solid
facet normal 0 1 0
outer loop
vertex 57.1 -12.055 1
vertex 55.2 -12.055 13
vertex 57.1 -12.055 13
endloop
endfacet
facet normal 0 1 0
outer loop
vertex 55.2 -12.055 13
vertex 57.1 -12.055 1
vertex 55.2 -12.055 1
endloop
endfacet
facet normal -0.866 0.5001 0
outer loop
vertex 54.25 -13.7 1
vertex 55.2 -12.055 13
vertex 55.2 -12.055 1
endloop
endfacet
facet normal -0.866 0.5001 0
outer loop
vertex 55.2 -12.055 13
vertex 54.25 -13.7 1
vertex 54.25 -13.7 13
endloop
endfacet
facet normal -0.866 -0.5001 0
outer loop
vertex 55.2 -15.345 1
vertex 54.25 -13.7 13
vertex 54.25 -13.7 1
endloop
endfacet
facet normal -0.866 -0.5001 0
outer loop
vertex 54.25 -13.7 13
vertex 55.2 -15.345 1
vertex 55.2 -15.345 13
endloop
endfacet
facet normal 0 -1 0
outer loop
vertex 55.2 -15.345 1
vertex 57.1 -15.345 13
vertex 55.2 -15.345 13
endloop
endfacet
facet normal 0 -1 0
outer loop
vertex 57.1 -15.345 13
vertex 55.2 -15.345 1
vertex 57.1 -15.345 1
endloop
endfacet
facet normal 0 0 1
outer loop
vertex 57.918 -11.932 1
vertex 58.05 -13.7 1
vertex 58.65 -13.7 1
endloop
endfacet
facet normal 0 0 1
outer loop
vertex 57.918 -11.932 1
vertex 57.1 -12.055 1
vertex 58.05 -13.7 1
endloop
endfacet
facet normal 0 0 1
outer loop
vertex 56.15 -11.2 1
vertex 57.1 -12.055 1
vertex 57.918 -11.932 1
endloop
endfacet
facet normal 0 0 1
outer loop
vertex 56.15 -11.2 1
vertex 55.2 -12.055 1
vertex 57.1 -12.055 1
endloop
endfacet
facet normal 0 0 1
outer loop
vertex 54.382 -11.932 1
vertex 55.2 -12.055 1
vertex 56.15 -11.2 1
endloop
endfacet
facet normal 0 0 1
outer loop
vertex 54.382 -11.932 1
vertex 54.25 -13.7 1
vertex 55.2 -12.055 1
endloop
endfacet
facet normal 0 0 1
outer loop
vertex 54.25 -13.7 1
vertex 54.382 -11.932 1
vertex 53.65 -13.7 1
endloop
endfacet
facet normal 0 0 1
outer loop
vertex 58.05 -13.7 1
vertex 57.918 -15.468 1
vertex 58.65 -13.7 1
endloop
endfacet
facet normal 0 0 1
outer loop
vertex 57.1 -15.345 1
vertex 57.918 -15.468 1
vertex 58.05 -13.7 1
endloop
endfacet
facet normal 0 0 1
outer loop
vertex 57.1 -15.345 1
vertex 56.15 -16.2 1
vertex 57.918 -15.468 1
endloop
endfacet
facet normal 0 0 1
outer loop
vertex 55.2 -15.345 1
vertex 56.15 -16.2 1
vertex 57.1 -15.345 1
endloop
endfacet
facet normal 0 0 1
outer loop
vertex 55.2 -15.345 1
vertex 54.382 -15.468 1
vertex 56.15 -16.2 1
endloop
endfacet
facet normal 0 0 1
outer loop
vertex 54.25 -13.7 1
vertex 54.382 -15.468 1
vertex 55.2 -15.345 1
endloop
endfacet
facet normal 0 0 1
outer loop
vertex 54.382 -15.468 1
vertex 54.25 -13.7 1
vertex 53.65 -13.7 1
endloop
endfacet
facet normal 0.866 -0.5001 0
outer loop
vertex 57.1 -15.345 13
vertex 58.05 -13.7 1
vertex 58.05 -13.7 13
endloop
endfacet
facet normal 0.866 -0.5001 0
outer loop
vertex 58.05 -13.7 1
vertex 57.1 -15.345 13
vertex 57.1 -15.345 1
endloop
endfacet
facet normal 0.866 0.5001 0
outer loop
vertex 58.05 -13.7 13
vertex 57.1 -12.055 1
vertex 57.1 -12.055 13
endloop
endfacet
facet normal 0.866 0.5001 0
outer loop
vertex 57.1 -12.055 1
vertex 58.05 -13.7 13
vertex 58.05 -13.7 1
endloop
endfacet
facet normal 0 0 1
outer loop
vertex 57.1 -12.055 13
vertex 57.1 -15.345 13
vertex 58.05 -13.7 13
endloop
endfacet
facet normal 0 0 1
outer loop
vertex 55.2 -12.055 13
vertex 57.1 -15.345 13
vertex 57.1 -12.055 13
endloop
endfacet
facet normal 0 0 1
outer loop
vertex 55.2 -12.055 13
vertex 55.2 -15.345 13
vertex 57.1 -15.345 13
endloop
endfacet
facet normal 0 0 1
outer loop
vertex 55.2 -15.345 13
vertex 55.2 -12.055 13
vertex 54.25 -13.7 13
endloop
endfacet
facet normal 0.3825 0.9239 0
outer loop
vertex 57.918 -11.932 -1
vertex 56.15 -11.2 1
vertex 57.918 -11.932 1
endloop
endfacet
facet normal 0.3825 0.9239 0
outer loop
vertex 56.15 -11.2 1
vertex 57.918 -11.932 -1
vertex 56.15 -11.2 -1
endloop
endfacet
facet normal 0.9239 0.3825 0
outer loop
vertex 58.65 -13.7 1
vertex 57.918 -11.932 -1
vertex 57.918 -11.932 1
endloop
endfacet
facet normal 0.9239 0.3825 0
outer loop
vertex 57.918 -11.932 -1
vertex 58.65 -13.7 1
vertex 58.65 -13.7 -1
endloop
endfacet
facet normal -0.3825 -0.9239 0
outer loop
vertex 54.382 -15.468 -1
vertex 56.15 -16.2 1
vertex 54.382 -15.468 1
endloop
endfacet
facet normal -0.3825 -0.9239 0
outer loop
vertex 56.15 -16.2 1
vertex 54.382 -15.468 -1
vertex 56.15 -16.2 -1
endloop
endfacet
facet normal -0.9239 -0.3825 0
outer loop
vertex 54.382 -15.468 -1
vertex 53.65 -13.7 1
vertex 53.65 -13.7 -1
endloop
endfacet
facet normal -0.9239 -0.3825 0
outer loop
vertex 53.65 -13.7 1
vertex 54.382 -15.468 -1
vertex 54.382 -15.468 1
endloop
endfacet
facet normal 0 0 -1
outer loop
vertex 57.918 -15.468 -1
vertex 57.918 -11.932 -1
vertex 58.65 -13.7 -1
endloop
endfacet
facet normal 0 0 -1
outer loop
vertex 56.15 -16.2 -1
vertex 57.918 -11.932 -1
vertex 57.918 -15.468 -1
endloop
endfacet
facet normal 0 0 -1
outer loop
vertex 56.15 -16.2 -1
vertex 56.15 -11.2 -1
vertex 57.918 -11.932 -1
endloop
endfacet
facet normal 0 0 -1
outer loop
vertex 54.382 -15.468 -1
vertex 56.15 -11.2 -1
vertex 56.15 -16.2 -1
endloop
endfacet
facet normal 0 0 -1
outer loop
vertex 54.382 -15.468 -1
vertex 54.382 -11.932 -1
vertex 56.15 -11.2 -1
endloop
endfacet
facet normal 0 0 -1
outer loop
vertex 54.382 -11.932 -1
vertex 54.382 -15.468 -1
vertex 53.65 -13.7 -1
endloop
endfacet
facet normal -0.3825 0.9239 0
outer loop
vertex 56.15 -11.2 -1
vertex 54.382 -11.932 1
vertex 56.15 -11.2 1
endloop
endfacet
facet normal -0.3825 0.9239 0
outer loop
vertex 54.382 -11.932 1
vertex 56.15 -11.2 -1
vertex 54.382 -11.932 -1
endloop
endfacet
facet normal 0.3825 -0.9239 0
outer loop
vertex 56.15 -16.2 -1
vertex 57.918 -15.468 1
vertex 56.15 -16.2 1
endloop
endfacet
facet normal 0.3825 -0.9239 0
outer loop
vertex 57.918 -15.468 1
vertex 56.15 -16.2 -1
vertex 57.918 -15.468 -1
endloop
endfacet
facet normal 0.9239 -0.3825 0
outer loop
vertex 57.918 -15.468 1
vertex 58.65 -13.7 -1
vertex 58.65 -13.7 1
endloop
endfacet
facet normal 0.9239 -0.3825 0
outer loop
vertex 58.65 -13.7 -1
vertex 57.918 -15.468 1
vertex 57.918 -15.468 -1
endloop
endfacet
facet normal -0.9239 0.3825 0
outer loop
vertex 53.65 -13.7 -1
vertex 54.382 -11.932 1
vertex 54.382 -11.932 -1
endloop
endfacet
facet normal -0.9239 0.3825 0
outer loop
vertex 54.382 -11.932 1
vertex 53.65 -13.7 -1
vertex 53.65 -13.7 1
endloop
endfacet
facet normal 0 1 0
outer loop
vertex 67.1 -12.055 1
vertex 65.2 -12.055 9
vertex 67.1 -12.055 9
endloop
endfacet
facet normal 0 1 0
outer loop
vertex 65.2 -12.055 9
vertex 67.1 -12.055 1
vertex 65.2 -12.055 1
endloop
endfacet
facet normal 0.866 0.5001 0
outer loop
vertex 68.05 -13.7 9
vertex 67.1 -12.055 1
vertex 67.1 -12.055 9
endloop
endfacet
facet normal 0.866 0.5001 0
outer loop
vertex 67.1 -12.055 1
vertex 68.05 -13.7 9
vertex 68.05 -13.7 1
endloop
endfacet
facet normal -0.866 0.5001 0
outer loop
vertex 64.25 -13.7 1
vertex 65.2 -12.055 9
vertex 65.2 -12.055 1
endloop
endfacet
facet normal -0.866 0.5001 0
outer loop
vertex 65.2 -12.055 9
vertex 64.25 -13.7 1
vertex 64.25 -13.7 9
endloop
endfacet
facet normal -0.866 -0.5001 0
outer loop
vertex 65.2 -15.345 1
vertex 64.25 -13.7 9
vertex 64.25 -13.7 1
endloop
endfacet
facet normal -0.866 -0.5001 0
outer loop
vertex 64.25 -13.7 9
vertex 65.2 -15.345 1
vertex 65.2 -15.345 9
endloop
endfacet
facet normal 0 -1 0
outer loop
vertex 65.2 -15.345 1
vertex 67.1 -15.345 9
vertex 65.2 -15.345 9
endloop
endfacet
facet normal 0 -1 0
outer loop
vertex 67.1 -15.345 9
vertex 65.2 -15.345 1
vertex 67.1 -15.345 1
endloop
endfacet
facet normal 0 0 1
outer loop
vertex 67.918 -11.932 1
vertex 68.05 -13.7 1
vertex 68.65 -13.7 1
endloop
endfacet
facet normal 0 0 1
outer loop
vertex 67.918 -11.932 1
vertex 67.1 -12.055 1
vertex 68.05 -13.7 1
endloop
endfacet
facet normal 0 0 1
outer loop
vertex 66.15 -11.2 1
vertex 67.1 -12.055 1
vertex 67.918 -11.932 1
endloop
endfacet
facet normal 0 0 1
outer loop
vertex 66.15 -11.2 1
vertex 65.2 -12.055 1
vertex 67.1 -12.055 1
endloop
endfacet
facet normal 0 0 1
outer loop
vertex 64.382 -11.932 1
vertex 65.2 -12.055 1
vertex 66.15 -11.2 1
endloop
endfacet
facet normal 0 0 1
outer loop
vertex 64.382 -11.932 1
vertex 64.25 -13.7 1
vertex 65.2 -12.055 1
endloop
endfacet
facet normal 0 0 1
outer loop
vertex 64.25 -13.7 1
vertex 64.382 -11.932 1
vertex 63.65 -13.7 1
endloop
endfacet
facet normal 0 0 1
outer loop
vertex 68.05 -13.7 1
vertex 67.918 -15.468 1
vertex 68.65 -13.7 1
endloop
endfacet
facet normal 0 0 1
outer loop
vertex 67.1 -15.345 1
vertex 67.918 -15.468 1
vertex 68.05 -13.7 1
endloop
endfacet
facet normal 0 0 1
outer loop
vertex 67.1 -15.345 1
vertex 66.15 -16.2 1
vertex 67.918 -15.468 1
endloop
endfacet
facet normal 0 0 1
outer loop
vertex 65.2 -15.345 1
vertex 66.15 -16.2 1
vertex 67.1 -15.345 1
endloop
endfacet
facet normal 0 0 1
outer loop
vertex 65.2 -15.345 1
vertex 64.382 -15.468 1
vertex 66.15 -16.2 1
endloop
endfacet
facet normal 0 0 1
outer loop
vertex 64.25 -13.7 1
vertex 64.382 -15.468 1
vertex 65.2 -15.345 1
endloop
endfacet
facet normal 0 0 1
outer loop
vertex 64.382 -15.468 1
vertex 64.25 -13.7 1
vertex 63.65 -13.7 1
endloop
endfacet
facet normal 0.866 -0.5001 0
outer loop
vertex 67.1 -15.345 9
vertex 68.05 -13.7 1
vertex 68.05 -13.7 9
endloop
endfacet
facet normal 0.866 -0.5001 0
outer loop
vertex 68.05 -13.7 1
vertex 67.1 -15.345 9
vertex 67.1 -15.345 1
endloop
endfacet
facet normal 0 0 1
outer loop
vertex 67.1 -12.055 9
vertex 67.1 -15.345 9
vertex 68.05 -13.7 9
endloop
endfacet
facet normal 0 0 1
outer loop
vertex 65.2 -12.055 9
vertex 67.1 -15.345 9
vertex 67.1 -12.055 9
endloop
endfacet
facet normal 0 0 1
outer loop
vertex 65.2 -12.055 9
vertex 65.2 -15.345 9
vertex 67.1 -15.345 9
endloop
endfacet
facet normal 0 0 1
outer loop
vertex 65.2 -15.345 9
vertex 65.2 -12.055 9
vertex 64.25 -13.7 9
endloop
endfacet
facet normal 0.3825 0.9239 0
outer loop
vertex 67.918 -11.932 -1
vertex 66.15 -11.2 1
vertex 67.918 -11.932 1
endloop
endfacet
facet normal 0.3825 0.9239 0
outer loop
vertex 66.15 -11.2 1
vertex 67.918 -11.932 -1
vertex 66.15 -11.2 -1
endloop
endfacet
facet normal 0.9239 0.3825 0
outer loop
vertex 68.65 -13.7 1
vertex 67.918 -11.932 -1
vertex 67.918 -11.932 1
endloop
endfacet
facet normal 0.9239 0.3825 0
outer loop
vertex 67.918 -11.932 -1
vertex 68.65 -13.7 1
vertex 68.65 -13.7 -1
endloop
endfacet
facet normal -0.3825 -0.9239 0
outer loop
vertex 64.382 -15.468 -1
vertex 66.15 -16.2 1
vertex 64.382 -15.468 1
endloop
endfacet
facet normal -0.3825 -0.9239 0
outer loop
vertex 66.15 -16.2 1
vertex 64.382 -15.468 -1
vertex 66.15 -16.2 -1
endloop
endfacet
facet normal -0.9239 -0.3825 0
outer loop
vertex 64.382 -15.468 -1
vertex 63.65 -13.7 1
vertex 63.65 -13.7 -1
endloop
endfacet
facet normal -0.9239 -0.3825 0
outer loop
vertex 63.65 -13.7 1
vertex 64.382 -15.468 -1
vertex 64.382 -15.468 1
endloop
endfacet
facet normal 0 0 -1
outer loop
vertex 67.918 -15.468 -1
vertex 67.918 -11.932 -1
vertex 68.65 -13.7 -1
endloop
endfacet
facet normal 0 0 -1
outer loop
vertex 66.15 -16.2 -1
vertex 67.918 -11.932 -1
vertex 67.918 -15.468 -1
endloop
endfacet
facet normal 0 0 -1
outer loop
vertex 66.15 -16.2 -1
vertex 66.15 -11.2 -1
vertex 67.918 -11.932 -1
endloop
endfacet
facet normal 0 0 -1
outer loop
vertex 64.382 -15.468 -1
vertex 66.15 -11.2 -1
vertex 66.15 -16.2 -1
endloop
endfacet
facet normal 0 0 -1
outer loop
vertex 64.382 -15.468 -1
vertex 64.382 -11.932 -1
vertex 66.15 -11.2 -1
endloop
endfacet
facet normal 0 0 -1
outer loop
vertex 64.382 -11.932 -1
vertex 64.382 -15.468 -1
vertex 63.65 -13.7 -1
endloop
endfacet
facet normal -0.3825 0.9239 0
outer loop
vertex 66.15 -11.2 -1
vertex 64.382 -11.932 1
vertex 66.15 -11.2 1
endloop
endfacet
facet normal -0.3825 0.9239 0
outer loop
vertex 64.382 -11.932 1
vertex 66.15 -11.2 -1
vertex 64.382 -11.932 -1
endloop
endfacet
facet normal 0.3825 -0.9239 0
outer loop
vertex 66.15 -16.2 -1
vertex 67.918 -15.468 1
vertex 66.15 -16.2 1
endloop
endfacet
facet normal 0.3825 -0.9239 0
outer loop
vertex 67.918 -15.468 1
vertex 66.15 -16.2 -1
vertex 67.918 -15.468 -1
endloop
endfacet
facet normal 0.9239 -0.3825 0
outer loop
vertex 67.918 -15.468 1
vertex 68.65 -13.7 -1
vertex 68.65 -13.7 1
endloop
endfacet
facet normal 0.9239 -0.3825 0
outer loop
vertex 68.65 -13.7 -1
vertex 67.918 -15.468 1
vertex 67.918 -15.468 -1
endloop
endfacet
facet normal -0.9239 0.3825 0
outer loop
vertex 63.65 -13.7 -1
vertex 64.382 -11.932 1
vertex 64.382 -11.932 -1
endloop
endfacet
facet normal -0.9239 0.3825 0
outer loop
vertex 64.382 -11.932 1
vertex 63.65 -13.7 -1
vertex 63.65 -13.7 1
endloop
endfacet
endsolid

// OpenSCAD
// file: board_cover.scad
use <body_thin.scad>

/**
* [x] screw plates
* [x] side hooks
*
*
*
*
*
*/

/**
 * TODO
 * - [x] sensor plate
 *.- reset button
 *.- [x] complete the perimeter
 * - figure out how to fix cover to the body 
 *
 */
$fn = 50;
cube1Rotation = [-15, 0, -30];
cube1Offset = [32, -127.5, 0];

cube2Rotation = [0, 0, 0];
cube2Offset = [-56.6, 0, 0];

resetButtonPosition = [56.15, -13.7, 0];
resetButtonRadius = 2;

hoverHeight = 13;
coverHeight = 9;

function getResetButtonPosition() = resetButtonPosition;
function getResetButtonRadius() = resetButtonRadius;
function getCoverHeight() = hoverHeight;

module cuttingcubes() {
  // cutting cube near main cluster
  translate(cube2Offset) {
    rotate([0, 0, 0]) {
      cube([206, 200, 200], center=true);
    }
  }

  // cutting cubes near the thumb cluster
  translate(cube1Offset) {
    rotate(cube1Rotation) {
      cube([200, 200, 200], center=true);
    }
  }
}

module verticalWall() {
  difference() {
    // cutting cube near main cluster
    translate([1, 0, 0]) {
      translate(cube2Offset) {
        rotate([0, 0, 0]) {
          cube([206, 200, 200], center=true);
        }
      }
    }

    // cutting cube near main cluster
    translate(cube2Offset) {
      rotate([0, 0, 0]) {
        cube([206, 210, 210], center=true);
      }
    }
  }
}

module usbPort() {
  // USB-C cut
  translate([60, 28, 3.5]) {
    rotate([0, 90, 90]) {
      hull() {
        cylinder(h=10, r=2.5, center=false);
        translate([0, 7, 0])
          cylinder(h=10, r=2.5, center=false);
      }
    }
  }
}

module innerWalls(coverHeight) {
  intersection() {
    difference() {
      translate([0, 0, -1]) {
        translate(getGlobalMove()) {
          linear_extrude(coverHeight) {
            minkowski() {
              import("outline.svg");
              circle(getWallThickness());
            }
          }
        }
      }
      cuttingcubes();
    }
    union() {
      translate([0, 1, 0]) {
        translate(cube1Offset) {
          rotate(cube1Rotation) {
            cube([200, 200, 200], center=true);
          }
        }
      }

      verticalWall();
    }
  }
}

module resetButtonWalls(coverHeight) {

  // reset button walls
  translate([0, 0, 3]) {
    translate(resetButtonPosition) {
      linear_extrude(coverHeight-3) {

        difference() {
          circle(r=resetButtonRadius + getWallThickness());
          circle(r=resetButtonRadius);
        }
      }
    }
  }
}

module cover() {

  difference() {
    translate(getGlobalMove()) {
      difference() {

        linear_extrude(coverHeight) {
          minkowski() {
            bodyProjection();
            circle(getWallThickness());
          }
        }

        union() {
          translate([0, 0, -1.5]) {
            linear_extrude(coverHeight) {
              minkowski() {
                bodyProjection();
                circle(0.3);
              }
            }
          }
        }
      }
    }
    cuttingcubes();

    // reset button cutout
    translate([0, 0, 6]) {
      translate(resetButtonPosition) {
        linear_extrude(10) {
          circle(r=resetButtonRadius);
        }
      }
    }

    //translate([-58, 20, 5]) {
    //  cube([12, 40, 11], center=true);
    //}

    usbPort();
  }

  resetButtonWalls(coverHeight);

  //cuttingcubes();

  //translate([-68, -5, -1]) {
  //cube([12, 5, 11], center=true);
  //}

  innerWalls(coverHeight);

  // hooks
  intersection() {
    hooksBlock();
    cuttingcubes();
  }
}

if (true) {
  cover();
}
// file: body_thin.scad
/**
 * [x] add screws islands
 * [x] add cover panel
 * [x] design cover for shield
 * [x] mark buttons positions
 * create a travel case
 * move battery location to the side
 * move sheld to the bottom
 * optimize the globalMove usage
 */

//hull() {
$fn = 40;
magnet_radius = 4 / 2 + 0.1;
globalMove = [-209.55, -99.5, 0];

holePosition1 = [161.15, 94.95, 0];
holePosition2 = [161.1, 113.9, 0];
holePosition3 = [237.1, 117.4, 0];
holePosition4 = [250.87, 70.05, 0];
wallThickness = 1.2;

sensorRadius = 20;
sensorPosition = [67, 13];

function getWallThickness() = wallThickness;
function getGlobalMove() = globalMove;
function getSensorPosition() = sensorPosition;
function getSensorRadius() = sensorRadius;

module bottom_panel(hide_side_magnets = false) {
  translate([-0, -0, 10.5]) {
    //translate([0, 0, 13]) {
    rotate([-3, 1, 0]) {
      translate([-20, 0, -12.8]) {
        cube([300, 200, 15], center=true);
      }

      translate([0, 0, 0]) {
        legs();
      }

      magnets2(hide_side_magnets1=hide_side_magnets);

      scale([1, -1, 1]) {
        magnets2(hide_side_magnets1=hide_side_magnets);
      }
    }
    //}
  }
}

module magnets2(hide_side_magnets1 = false) {
  leg1 = [64.4, -21.0, 15];
  translate(leg1) {
    cylinder(h=40, r=magnet_radius, center=true);
  }

  if (!hide_side_magnets1) {
    rotate([0, 0, 180]) {
      translate(leg1) {
        cylinder(h=40, r=magnet_radius, center=true);
      }
    }
  }
  translate([0, -22, 15]) {
    cylinder(h=40, r=magnet_radius, center=true);
  }
}

module battery() {
  cube([25, 43, 5]);
}

module legs() {
  legmove1 = [43, 21.0, 0];
  //legmove2 = [43, 11.0, 0];
  translate([0, 0, -5.0]) {

    translate([75, 15, 0]) {
      cube([12, 3.5, 1], center=true);
    }

    translate(legmove1) {
      leg3();
    }

    scale([-1, 1, 1]) {
      translate(legmove1) {
        leg3();
      }
    }

    scale([-1, -1, 1]) {
      translate(legmove1) {
        leg3();
      }
    }

    scale([1, -1, 1]) {
      translate(legmove1) {
        leg3();
      }
    }

    //    scale([1, -1, 1]) {
    //  translate(legmove2) {
    //    leg();
    //  }
    //}
    //translate([102, 14.5, 0]) {
    //  leg();
    //}
  }

  module leg3() {
    leg();

    translate([0, 10, 0]) {
      leg();
    }

    translate([0, -10, 0]) {
      leg();
    }

    translate([0, 20, 0]) {
      leg();
    }
  }

  /*
  translate([-64, -25, -7.5]) {

    rotate([0, 0, -40]) {
      translate([2, -7, 0]) {
        leg();
      }
      translate([2, 2, 0]) {
        leg();
      }
    }

    translate([102, 5.5, 0]) {
      leg();
    }
    translate([102, 14.5, 0]) {
      leg();
    }

    translate([-5, 56, 0]) {
      leg();
    }
    translate([-5, 46, 0]) {
      leg();
    }

    translate([102, 46, 0]) {
      leg();
    }
    translate([102, 55, 0]) {
      leg();
    }
  } */
}

module leg() {
  cube([20, 3.5, 1], center=true);
  /*
  linear_extrude(2, center=true) {
    hull() {
      circle(4);

      translate([14, 0, 0]) {
        circle(4);
      }
    }
  }
  */
}

module stand() {
  difference() {
    union() {
      cylinder(h=4, r=1.8);
      cylinder(h=3, r1=4.5, r2=4);
    }
    cylinder(h=5, r=1);
  }
}

module pcb() {
  translate([0, 0, 12.5]) {
    linear_extrude(1.5) {
      psbProjectionNormalized();
    }
  }
}

module bodyProjectionNormalized() {
  union() {
    psbProjectionNormalized();

    translate(sensorPosition) {
      circle(r=sensorRadius - wallThickness / 2);
    }
  }
}

module psbProjectionNormalized() {
  translate(globalMove) {
    import("outline.svg");
  }
}

module bodyProjection(showTouchpad = false) {
  import("outline.svg");

  if (showTouchpad) {
    translate(-globalMove) {
      translate(sensorPosition) {
        circle(r=sensorRadius - wallThickness / 2);
      }
    }
  }
}

module bodyProjectionTouchpad() {
  import("outline.svg");

  translate(-globalMove) {
    translate(sensorPosition) {
      circle(r=sensorRadius - wallThickness / 2);
    }
  }
}

module body() {

  difference() {
    translate(globalMove) {
      union() {

        difference() {
          linear_extrude(15.5) {
            minkowski() {
              bodyProjection();
              circle(wallThickness);
            }
          }

          translate([0, 0, 9]) {
            linear_extrude(10) {
              minkowski() {
                bodyProjection();
                circle(0.3);
              }
            }
          }

          //translate([3, 0, 6]) {
          //  battery();
          //}

          translate([6, 270, 13])
            cube([8, 30, 10]);
        }

        linear_extrude(11.5) {
          minkowski() {
            import("outline_empty.svg");
            circle(0.3);
          }
        }
      }
    }

    bottom_panel();

    // power slider cutout
    translate([77.2, -15, 17]) {
      cube([30, 8, 8], center=true);
      translate([-10, 0, 0]) {
        rotate([0, -90, 0]) {
          rotate([0, 0, 45]) {
            cylinder(h=3, r1=9, r2=1, center=true, $fn=4);
          }
        }
      }
    }
  }

  translate([0, 0, 8.5]) {
    translate(globalMove) {
      stands();
    }
  }

  // control helpers
  if (false) {
    translate(globalMove) {
      linear_extrude(height=30) {
        import("controls.svg");
      }
    }
  }
}

//translate([0, 230, 7])
//  cube([3, 3, 3]);

//bottom_panel();

//difference() {

//bodyoutline();

//translate([-119.4, 0, 0]) {
//  cube([100, 100, 100], center=true);
//}

//translate([50,150,-10]) {
//  cube([100,100,100]);
//}
//}

module holesInPanel() {
  holeRadius = 1;

  translate([0, 0, 0]) {
    //linear_extrude(10) {
    //import("holes.svg");
    //}

    translate(holePosition1)
      cylinder(r=holeRadius, h=10, center=true);

    translate(holePosition2)
      cylinder(r=holeRadius, h=10, center=true);

    translate(holePosition3)
      cylinder(r=holeRadius, h=10, center=true);

    translate(holePosition4)
      cylinder(r=holeRadius, h=10, center=true);
  }
}

module stands() {
  holeRadius = 1;

  translate(holePosition1)
    stand();

  translate(holePosition2)
    stand();

  translate(holePosition3)
    stand();

  translate(holePosition4)
    stand();
}

module hooksBlock(offset = 0) {

  hookHeight = 0.6;

  translate([48, 30, -1 + hookHeight / 2])
    cylinder(h=0.6 + offset, r1=3 + offset, r2=2 + offset, center=true);

  translate([48, -10, -1 + hookHeight / 2])
    cylinder(h=0.6 + offset, r1=3 + offset, r2=2 + offset, center=true);

  translate([51, -17.5, -1 + hookHeight / 2])
    cylinder(h=0.6 + offset, r1=3 + offset, r2=2 + offset, center=true);

  translate([64, -25, -1 + hookHeight / 2])
    cylinder(h=0.6 + offset, r1=3 + offset, r2=2 + offset, center=true);
}

module panel() {

  translate([0, 0, 14]) {
    translate(globalMove) {
      // holesInPanel();
      difference() {

        linear_extrude(1.5) {
          //minkowski() {
          import("outline.svg");
          //circle(0.1);
          //}
        }

        translate([0, 0, -5])
          linear_extrude(10) {
            import("buttons.svg");
          }

        holesInPanel();

        translate([268.4, 95, 0]) {
          difference() {
            cube([25, 90, 40], center=true);
            translate([-10, -60, 0]) {
              rotate([0, 0, 60]) {
                cube([80, 80, 50], center=true);
              }
            }
          }
        }
        translate(-globalMove) {
          translate([0, 0, 1]) {
            hooksBlock(0.2);
          }
        }
      }
    }
  }
}

//translate([0, 0, 15]) {
//  cover();
//}

//panelbuttons(fullheight=false);

//outline();

//cover();

if (false) {
  panel();
}
//holesInPanel();

//difference() {
if (true) {
  union() {
    body();
  }
}

//pcb();

//translate([-100,0,0])
//inspection cube
//cube([100, 100, 100], center=true);

//}

// bodyProjection();

//linear_extrude(12) {
//minkowski() {
//import("outline_empty_sp.svg");
//circle(0.3);
//}
//        }
// main file
use <body_thin.scad>
use <board_cover.scad>

module resetButton(buttonHeight = 12) {
  // reset button
  translate([0, 0, 1]) {
    translate(getResetButtonPosition()) {
      linear_extrude(buttonHeight) {
        circle(r=getResetButtonRadius() - 0.1);
      }
    }
  }

  translate([0, 0, -1]) {
    translate(getResetButtonPosition()) {
      linear_extrude(2) {
        circle(r=getResetButtonRadius() + 0.5);
      }
    }
  }
}

module resetButtonSmall() {
  resetButton(8);
}

resetButton();

translate([10,0,0]) {
resetButtonSmall();
}
